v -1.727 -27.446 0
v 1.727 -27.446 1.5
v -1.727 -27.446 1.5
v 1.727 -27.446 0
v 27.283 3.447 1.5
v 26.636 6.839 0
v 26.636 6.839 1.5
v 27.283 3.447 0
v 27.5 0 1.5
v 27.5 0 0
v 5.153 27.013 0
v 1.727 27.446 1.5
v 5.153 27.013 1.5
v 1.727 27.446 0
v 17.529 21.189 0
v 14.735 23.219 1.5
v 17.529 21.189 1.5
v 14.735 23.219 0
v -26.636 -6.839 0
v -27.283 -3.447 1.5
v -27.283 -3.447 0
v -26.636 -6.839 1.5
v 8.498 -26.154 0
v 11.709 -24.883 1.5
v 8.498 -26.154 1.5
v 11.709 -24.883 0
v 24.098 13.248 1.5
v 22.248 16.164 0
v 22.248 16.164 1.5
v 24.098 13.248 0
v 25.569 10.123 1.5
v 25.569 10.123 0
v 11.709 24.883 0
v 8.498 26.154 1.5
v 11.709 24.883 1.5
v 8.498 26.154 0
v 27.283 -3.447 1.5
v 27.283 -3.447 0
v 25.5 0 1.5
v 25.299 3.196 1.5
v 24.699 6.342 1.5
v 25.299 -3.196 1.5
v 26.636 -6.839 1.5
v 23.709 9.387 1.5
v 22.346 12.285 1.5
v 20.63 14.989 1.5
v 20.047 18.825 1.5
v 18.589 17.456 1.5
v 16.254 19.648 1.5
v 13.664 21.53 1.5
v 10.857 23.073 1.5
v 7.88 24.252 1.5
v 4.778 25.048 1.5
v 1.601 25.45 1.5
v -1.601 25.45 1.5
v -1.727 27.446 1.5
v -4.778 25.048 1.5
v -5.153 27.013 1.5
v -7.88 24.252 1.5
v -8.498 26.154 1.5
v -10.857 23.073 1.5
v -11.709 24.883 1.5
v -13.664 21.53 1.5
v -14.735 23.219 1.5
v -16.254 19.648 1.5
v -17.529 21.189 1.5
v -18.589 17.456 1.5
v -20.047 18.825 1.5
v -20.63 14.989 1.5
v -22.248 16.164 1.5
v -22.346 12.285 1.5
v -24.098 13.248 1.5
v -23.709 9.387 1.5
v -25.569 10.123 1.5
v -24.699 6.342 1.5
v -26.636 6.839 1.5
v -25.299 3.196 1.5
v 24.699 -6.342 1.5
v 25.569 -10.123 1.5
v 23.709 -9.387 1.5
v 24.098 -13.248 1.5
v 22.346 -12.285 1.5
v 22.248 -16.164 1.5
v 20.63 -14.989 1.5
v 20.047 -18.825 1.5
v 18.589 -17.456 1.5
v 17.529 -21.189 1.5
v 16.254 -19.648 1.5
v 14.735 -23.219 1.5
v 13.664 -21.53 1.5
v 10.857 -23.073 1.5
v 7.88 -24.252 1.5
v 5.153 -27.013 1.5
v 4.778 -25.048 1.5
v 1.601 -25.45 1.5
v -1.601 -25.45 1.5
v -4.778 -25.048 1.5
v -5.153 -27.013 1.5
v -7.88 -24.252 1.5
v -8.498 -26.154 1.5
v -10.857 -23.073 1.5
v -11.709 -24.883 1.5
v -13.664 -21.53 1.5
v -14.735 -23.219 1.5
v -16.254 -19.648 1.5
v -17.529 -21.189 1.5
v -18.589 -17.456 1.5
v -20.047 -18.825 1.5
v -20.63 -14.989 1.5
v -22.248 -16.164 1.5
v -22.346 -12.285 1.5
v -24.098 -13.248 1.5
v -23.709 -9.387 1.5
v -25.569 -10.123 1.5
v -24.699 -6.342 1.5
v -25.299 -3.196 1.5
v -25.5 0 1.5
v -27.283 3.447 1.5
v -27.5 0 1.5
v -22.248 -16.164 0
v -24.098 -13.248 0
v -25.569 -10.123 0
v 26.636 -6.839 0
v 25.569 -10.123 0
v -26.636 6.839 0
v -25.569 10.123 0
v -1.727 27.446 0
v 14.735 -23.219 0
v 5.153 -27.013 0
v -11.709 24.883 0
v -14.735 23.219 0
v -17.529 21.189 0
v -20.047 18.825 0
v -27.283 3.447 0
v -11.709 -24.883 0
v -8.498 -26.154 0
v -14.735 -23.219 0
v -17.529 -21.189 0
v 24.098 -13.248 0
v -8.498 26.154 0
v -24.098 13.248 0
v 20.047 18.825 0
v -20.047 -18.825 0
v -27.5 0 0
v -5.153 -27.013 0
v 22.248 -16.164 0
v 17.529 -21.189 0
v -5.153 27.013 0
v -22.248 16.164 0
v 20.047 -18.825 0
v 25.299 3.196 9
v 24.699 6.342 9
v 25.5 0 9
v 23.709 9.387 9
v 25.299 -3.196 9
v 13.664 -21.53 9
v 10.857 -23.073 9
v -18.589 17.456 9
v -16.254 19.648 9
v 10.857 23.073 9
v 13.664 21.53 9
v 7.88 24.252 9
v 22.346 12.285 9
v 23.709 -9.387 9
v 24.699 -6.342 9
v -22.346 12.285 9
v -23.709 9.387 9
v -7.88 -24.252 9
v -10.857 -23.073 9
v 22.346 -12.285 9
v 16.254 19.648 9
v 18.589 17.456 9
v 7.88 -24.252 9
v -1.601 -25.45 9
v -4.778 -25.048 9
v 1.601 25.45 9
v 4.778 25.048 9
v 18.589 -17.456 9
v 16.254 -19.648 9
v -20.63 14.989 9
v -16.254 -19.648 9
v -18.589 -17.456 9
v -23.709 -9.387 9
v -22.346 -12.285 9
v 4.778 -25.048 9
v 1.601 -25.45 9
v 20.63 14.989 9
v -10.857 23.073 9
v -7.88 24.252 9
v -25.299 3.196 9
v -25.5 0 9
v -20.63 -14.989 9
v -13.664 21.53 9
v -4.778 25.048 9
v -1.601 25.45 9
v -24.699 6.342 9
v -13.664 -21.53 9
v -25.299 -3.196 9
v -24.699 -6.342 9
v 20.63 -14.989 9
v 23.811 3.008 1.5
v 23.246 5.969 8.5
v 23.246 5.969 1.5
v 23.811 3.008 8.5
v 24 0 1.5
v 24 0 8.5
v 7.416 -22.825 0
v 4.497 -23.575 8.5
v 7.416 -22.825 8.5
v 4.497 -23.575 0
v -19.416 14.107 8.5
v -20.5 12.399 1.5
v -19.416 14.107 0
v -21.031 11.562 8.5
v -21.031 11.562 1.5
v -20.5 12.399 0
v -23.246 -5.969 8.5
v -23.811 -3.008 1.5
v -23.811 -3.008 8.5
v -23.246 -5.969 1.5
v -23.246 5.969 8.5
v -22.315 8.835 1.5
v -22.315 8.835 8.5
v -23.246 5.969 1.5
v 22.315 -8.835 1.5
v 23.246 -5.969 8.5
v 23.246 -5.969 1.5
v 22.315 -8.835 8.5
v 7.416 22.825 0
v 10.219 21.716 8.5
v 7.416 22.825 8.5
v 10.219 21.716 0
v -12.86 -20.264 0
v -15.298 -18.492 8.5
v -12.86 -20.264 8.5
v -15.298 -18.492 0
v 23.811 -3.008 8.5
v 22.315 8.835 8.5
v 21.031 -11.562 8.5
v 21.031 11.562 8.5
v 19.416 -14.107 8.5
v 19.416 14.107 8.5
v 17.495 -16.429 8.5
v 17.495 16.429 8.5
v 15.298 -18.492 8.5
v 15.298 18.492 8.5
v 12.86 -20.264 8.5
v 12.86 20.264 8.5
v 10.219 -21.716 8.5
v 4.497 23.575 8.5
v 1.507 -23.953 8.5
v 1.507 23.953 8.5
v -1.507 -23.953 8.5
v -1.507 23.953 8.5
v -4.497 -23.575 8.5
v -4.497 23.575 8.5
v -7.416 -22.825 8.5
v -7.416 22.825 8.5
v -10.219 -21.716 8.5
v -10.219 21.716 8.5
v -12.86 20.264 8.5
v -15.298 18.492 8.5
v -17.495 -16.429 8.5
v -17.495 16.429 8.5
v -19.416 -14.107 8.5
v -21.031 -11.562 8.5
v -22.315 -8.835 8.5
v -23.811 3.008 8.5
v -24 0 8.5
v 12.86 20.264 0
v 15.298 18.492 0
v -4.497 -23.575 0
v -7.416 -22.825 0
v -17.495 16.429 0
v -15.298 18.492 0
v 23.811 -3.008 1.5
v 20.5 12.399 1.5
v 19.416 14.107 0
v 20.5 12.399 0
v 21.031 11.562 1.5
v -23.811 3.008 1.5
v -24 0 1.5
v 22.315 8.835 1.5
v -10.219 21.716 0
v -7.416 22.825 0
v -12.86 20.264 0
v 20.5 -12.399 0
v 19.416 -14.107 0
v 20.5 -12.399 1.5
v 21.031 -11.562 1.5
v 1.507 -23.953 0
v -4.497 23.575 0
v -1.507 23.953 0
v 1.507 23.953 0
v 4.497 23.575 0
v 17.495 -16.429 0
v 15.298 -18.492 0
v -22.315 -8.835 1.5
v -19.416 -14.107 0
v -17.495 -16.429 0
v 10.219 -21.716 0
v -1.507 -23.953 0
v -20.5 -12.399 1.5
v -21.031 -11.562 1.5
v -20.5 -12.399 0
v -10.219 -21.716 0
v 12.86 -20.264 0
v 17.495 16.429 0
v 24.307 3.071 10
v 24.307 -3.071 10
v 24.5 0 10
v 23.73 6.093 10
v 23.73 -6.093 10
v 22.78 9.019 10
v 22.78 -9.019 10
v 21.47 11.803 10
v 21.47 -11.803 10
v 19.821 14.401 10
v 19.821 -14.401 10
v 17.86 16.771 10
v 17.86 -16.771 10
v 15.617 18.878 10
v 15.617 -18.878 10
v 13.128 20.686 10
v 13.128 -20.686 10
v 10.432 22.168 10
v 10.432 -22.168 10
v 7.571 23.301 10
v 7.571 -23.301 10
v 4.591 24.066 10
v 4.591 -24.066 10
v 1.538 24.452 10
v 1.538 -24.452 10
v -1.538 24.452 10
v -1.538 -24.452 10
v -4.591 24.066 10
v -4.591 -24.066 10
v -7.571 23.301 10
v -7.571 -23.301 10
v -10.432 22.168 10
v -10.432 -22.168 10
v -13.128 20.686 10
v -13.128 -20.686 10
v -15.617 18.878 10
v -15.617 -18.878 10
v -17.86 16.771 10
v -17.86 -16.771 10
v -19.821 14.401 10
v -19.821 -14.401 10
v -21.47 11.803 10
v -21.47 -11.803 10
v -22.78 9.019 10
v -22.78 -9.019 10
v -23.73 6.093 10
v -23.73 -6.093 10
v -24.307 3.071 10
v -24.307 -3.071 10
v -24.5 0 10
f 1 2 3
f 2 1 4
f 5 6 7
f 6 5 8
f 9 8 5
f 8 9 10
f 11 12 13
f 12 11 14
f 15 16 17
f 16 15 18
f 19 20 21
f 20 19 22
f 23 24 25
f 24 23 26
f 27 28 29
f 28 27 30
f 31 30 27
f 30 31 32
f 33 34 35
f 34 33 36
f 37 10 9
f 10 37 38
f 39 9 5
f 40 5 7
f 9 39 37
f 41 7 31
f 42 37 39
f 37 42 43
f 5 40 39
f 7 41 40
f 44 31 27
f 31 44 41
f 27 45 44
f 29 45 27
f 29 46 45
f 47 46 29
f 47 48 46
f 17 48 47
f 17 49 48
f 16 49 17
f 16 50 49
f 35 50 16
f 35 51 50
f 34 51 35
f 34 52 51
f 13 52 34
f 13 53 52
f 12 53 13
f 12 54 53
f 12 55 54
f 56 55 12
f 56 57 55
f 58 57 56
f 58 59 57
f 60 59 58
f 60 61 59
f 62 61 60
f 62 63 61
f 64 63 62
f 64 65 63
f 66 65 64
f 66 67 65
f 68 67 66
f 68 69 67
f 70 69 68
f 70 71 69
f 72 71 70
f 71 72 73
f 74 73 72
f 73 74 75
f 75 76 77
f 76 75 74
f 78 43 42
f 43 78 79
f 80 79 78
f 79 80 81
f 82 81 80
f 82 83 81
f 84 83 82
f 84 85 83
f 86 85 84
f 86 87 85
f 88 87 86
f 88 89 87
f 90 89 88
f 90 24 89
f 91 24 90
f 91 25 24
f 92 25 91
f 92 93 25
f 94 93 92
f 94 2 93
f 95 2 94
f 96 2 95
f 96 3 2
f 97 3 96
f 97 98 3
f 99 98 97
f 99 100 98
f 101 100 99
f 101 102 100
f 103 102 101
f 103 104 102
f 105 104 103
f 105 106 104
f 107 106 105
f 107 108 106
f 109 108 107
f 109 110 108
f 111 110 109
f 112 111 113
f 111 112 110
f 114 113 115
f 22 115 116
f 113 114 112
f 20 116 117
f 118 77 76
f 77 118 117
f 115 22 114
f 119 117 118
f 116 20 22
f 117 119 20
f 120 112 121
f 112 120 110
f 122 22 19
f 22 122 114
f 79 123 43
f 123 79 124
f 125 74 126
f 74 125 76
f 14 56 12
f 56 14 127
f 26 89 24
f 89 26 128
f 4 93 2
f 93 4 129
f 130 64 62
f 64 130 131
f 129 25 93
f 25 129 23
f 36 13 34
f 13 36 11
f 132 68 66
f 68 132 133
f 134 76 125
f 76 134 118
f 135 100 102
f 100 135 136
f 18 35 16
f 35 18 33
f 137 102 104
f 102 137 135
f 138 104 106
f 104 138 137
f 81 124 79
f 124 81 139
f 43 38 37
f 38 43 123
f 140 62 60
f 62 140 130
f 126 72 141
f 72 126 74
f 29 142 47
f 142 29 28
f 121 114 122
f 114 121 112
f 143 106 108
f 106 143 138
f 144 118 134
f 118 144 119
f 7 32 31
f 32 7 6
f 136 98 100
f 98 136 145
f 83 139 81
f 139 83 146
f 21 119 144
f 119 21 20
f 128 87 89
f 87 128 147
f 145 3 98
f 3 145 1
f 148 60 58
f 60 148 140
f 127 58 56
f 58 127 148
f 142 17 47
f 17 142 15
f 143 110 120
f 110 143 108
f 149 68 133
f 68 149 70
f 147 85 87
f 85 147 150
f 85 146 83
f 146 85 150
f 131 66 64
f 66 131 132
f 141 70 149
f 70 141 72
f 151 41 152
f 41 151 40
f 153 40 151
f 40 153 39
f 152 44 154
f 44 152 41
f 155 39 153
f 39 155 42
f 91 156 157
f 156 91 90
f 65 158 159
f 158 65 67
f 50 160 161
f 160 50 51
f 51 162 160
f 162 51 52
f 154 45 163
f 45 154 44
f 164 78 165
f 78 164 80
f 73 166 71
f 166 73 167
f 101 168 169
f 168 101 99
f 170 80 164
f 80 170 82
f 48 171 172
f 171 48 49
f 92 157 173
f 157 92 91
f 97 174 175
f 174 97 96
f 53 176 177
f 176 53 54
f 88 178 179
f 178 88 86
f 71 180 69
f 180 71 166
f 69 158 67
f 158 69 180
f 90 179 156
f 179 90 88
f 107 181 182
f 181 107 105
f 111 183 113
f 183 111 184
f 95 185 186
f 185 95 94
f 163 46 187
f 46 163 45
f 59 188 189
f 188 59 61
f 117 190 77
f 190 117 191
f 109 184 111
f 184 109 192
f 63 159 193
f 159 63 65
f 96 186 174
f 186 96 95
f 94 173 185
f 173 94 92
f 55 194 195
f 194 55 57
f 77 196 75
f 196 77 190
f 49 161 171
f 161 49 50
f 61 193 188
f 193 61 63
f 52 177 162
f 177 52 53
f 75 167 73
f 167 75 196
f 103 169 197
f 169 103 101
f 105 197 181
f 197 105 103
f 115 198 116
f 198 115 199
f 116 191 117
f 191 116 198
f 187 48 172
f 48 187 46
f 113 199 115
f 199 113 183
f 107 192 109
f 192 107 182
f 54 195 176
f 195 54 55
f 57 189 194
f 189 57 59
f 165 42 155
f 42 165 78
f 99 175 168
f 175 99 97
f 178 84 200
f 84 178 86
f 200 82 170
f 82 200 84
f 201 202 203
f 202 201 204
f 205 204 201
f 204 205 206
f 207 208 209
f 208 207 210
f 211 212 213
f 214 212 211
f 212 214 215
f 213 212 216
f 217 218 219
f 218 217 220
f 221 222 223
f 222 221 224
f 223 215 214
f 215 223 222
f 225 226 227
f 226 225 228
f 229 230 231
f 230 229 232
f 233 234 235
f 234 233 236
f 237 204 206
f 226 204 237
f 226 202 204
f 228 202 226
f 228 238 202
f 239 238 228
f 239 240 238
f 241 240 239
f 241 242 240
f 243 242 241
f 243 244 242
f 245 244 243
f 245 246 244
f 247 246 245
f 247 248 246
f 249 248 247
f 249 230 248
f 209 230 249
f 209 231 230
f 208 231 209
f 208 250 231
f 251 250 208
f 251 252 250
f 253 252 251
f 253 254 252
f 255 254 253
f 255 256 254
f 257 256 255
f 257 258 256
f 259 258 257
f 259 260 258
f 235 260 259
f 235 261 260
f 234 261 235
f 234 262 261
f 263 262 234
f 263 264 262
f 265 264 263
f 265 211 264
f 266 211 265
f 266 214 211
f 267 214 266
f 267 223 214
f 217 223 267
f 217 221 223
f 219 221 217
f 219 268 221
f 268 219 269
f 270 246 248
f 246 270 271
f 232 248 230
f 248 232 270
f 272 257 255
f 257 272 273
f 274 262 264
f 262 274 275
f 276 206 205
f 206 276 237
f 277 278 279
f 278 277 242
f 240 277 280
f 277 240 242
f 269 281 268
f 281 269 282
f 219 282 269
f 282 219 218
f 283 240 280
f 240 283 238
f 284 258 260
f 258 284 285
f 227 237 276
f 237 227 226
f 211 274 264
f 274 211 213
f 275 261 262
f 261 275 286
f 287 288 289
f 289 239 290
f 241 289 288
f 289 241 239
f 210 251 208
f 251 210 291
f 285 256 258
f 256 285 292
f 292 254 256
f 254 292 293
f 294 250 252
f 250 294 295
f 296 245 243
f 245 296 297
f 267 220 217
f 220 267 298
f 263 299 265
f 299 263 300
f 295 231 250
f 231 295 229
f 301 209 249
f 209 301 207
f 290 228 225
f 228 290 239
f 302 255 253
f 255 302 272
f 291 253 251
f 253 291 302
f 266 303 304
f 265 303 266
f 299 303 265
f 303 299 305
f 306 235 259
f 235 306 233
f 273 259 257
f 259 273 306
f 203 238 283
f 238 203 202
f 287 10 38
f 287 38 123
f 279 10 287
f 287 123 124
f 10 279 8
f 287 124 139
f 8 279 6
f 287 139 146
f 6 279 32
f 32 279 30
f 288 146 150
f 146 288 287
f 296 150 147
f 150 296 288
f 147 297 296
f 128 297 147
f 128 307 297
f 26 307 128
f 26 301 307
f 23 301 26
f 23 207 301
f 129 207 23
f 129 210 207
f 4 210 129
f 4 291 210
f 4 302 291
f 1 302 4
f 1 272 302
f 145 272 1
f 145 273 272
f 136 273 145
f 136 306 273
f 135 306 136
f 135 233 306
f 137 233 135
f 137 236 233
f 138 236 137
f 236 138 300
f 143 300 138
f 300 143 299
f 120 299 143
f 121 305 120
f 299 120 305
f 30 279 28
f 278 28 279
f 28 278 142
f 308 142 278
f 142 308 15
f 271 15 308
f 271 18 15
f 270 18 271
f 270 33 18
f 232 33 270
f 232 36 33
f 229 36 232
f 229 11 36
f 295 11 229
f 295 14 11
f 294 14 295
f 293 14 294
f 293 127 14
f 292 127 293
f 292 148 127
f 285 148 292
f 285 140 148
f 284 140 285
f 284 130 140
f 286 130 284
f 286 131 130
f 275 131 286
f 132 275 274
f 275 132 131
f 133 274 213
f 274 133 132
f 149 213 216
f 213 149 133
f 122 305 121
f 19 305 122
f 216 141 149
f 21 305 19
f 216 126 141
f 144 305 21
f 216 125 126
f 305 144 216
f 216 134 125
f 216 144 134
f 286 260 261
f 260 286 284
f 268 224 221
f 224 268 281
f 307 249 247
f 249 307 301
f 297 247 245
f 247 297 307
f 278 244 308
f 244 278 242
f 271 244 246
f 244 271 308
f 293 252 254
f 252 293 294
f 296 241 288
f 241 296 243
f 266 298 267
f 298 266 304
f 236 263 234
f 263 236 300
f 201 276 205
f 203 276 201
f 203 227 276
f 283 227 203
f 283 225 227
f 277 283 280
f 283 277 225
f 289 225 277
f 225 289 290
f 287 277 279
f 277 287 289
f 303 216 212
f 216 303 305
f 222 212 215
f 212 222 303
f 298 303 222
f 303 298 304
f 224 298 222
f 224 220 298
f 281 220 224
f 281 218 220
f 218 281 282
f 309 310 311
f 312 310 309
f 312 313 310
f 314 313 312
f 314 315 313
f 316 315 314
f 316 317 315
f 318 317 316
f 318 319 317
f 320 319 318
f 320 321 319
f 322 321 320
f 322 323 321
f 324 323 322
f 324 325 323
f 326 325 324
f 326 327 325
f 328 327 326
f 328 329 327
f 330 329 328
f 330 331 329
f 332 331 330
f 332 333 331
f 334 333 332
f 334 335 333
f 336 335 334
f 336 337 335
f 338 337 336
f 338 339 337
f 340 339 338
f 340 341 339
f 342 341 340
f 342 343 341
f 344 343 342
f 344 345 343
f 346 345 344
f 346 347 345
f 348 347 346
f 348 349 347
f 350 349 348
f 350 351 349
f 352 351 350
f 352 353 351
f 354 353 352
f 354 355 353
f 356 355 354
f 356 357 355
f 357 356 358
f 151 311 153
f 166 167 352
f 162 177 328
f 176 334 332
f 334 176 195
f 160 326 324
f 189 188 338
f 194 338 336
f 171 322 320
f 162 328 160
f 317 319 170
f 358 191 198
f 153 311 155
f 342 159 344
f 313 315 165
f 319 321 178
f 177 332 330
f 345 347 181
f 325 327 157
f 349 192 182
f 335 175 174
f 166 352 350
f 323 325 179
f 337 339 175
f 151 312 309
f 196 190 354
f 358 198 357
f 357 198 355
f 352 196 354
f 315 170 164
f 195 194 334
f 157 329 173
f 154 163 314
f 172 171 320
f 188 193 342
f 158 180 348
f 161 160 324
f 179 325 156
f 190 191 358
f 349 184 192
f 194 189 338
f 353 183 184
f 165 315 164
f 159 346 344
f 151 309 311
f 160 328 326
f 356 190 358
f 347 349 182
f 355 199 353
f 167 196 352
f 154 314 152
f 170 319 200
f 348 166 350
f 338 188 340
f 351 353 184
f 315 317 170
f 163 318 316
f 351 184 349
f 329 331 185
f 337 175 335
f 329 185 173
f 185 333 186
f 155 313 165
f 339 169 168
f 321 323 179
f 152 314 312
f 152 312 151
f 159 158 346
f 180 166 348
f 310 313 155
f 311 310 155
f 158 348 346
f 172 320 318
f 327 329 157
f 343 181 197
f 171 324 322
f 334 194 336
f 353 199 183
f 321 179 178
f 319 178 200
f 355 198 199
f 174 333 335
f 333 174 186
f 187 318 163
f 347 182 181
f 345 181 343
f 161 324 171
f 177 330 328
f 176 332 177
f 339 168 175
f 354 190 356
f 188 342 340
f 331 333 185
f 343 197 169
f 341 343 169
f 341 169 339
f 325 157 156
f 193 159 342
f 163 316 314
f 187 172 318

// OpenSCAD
TUBE_OUTER_DIA = 55;
TUBE_INNER_DIA = 51;

HEIGHT = 10;
THICKNESS = 1.5;

CAP_LIP = 5;
CHAMFER_SIZE = 1;

$fn = 50;

module tube() {
  difference() {
    cylinder(d = TUBE_OUTER_DIA, h = HEIGHT);
    cylinder(d = TUBE_INNER_DIA, h = HEIGHT);
  }
}

module cap() {
  difference() {
    cylinder(d = TUBE_INNER_DIA - 2 * THICKNESS, h = HEIGHT - THICKNESS);

    translate([(TUBE_INNER_DIA/2 - CAP_LIP), -TUBE_INNER_DIA/2, 0])
    cube(size = [TUBE_INNER_DIA, TUBE_INNER_DIA, THICKNESS]);

    translate([-TUBE_INNER_DIA - (TUBE_INNER_DIA/2 - CAP_LIP), -TUBE_INNER_DIA/2, 0])
    cube(size = [TUBE_INNER_DIA, TUBE_INNER_DIA, THICKNESS]);
  }
}

module chamfer() {
  difference() {
    cylinder(d = TUBE_OUTER_DIA, h = CHAMFER_SIZE);
    cylinder(d1 = TUBE_INNER_DIA, d2 = TUBE_INNER_DIA - 2 * CHAMFER_SIZE, h = CHAMFER_SIZE);
  }
}

module cover() {
  difference() {
    cylinder(d = TUBE_OUTER_DIA, h = HEIGHT);
    #translate([0, 0, THICKNESS])
    tube();
    #cap();
    #translate([0, 0, HEIGHT - CHAMFER_SIZE])
    chamfer();
  }
}

cover();
